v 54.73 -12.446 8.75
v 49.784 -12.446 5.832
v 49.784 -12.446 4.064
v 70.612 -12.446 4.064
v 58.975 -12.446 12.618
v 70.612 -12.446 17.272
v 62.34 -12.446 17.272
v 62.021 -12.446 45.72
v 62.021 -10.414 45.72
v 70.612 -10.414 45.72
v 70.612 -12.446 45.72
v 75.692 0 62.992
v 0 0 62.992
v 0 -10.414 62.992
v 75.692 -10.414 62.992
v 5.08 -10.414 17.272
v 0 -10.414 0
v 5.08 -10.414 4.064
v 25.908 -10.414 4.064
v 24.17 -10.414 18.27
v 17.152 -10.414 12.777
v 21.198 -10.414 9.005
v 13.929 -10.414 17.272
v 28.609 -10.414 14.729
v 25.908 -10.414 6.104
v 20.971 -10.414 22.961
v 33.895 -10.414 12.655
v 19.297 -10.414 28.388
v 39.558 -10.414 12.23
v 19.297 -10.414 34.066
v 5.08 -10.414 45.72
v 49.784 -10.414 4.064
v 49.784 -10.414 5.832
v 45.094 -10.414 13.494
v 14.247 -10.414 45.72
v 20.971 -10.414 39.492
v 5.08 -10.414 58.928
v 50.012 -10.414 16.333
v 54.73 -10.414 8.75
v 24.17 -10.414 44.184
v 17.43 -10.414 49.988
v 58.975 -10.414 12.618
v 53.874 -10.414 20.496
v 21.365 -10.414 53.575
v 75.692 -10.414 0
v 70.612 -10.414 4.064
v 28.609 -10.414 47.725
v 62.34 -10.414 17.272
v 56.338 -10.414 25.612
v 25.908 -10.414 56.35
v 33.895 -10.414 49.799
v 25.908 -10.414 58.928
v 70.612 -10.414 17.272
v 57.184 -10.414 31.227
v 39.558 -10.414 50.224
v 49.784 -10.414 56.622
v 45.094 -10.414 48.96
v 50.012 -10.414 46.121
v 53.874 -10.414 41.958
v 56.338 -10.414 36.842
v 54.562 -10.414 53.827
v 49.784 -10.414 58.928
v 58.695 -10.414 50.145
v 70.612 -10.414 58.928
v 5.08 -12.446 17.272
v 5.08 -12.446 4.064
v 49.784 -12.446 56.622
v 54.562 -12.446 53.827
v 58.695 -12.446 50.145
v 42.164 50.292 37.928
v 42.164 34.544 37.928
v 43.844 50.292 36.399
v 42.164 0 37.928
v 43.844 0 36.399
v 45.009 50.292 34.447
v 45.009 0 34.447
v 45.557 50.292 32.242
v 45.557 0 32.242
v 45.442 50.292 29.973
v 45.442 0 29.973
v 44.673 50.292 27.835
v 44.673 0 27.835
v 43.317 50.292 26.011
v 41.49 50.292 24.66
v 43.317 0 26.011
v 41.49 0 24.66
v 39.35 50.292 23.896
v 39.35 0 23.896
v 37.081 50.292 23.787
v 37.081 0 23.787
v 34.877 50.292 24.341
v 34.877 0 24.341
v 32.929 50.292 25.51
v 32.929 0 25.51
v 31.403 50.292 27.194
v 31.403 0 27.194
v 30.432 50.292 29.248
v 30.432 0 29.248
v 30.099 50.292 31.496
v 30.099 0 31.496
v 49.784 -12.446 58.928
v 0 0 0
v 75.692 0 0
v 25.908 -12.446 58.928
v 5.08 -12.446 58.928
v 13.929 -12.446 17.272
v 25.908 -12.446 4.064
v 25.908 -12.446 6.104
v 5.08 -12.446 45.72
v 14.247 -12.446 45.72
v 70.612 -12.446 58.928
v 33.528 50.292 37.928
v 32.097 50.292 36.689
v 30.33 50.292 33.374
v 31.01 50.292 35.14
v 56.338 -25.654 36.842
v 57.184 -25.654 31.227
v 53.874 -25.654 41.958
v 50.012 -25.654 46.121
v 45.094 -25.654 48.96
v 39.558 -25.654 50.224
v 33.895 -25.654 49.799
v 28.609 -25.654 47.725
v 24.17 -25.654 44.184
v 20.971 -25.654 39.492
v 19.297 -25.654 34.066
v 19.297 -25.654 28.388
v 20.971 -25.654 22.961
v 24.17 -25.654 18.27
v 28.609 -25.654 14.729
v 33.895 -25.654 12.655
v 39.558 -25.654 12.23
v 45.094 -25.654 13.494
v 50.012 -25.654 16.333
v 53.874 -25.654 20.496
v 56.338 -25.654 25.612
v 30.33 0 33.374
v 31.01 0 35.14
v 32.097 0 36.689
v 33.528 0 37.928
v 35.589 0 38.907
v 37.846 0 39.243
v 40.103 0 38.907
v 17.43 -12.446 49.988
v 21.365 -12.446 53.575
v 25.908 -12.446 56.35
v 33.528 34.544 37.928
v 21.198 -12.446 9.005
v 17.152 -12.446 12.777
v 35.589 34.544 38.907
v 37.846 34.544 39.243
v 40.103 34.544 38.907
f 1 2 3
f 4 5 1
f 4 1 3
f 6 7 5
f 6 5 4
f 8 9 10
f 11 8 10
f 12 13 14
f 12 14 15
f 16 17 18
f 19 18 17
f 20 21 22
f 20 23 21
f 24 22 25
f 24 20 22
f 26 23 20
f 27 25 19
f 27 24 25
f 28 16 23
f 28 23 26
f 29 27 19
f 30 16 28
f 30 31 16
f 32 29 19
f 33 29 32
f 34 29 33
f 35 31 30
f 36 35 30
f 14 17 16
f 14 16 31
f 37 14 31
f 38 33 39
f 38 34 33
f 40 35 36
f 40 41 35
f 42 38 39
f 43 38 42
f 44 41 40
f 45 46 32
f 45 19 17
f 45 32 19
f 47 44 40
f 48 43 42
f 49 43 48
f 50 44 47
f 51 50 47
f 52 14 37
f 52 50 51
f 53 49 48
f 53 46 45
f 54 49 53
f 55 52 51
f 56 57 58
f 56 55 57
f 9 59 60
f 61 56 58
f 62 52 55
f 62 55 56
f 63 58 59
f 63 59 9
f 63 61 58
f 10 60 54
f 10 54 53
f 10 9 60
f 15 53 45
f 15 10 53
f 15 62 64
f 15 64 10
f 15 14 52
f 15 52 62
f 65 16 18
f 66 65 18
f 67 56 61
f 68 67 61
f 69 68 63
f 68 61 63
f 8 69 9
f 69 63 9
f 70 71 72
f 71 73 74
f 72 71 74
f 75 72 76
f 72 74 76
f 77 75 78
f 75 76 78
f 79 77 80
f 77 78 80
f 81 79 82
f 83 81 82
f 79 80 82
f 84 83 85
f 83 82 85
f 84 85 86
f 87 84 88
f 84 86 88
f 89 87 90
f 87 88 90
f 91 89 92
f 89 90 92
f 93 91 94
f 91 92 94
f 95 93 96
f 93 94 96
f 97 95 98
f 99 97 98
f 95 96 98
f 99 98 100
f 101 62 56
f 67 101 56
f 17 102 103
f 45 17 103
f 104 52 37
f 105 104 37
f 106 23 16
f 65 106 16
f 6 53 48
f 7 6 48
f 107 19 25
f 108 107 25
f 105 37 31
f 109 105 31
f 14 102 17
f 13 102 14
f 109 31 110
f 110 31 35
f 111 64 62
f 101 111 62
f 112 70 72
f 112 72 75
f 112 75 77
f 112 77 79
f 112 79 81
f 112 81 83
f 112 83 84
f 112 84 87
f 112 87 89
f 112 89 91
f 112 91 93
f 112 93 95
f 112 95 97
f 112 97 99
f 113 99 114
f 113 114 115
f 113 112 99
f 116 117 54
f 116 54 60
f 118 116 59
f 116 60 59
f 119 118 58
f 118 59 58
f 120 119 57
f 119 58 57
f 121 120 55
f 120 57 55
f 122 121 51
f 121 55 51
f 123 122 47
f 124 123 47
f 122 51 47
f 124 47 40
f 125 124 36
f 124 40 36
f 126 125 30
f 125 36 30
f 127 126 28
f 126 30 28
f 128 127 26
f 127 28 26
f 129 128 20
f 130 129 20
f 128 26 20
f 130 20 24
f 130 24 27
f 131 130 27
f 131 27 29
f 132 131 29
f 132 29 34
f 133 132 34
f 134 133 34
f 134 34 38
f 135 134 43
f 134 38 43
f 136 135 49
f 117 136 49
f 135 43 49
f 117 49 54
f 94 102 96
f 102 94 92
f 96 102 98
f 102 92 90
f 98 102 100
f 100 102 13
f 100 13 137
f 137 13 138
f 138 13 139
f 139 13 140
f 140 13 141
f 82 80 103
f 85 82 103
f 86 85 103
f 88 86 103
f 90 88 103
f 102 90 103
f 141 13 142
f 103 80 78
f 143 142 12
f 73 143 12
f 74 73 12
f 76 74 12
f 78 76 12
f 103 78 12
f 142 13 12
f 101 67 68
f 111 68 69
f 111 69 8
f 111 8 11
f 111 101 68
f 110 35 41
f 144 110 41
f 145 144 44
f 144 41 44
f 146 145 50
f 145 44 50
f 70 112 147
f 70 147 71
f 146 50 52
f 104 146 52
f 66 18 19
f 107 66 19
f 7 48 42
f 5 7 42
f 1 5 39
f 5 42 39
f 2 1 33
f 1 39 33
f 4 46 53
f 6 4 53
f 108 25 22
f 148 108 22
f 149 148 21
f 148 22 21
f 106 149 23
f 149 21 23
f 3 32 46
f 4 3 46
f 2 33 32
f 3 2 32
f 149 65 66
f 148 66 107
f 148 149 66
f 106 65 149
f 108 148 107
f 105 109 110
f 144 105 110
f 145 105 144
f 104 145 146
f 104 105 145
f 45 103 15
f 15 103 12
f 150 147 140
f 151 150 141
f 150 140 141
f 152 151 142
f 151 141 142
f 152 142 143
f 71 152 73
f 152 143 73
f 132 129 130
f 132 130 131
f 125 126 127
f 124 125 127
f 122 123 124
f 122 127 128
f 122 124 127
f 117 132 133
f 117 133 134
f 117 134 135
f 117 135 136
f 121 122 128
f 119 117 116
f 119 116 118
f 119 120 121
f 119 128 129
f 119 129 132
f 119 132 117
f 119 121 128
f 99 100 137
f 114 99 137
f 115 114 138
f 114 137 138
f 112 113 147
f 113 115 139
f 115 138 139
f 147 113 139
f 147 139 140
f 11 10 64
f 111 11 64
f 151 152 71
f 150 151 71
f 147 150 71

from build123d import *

# Parameters (mm, degrees)
F0_W     = 75.692
F0_H     = 62.992
F1_DEPTH = 10.414
F3_DEPTH = 2.032
F4_R     = 19.05
F5_DEPTH = 15.24
F7_DEPTH = 50.292
F8_DEPTH = 34.544


with BuildPart() as f1:
    # F0 (on Front) → F1 (new body)
    with BuildSketch(Plane.XZ):
        with Locations((37.846, 31.496)):
            Rectangle(F0_W, F0_H)
    extrude(amount=F1_DEPTH)

    # F2 (on face) → F3 (join)
    with BuildSketch(Plane.XZ.offset(10.414)):
        with BuildLine():
            Line((49.784, 4.064), (70.612, 4.064))
            Line((70.612, 4.064), (70.612, 17.272))
            Line((70.612, 17.272), (62.339714, 17.272))
            ThreePointArc((62.339714, 17.272), (56.952336, 10.57447), (49.784, 5.831505))
            Line((49.784, 5.831505), (49.784, 4.064))
        make_face()
        with BuildLine():
            Line((5.08, 17.272), (5.08, 4.064))
            Line((5.08, 4.064), (25.908, 4.064))
            Line((25.908, 4.064), (25.908, 6.103985))
            ThreePointArc((25.908, 6.103985), (19.081744, 10.790558), (13.928818, 17.272))
            Line((13.928818, 17.272), (5.08, 17.272))
        make_face()
        with BuildLine():
            Line((25.908, 58.928), (5.08, 58.928))
            Line((5.08, 58.928), (5.08, 45.72))
            Line((5.08, 45.72), (14.247149, 45.72))
            ThreePointArc((14.247149, 45.72), (19.311604, 51.875193), (25.908, 56.349862))
            Line((25.908, 56.349862), (25.908, 58.928))
        make_face()
        with BuildLine():
            Line((70.612, 58.928), (49.784, 58.928))
            Line((49.784, 58.928), (49.784, 56.622342))
            ThreePointArc((49.784, 56.622342), (56.720072, 52.088644), (62.021382, 45.72))
            Line((62.021382, 45.72), (70.612, 45.72))
            Line((70.612, 45.72), (70.612, 58.928))
        make_face()
    extrude(amount=F3_DEPTH)

    # F4 (on face) → F5 (join)
    with BuildSketch(Plane.XZ.offset(10.414)):
        with Locations((38.134266, 31.226924)):
            Circle(F4_R)
    extrude(amount=F5_DEPTH)

    # F6 (on face) → F7 (join)
    with BuildSketch(Plane(origin=(0, 0, 0), x_dir=(-1, 0, 0), z_dir=(0, 1, 0))):
        with BuildLine():
            ThreePointArc((-42.164043, 37.927991), (-41.490457, 24.659777), (-30.099, 31.496))
            ThreePointArc((-30.099, 31.496), (-31.009777, 35.140457), (-33.527957, 37.927991))
            Line((-33.527957, 37.927991), (-42.164043, 37.927991))
        make_face()
    extrude(amount=F7_DEPTH)

    # F6 (on face) → F8 (join)
    with BuildSketch(Plane(origin=(0, 0, 0), x_dir=(-1, 0, 0), z_dir=(0, 1, 0))):
        with BuildLine():
            Line((-42.164043, 37.927991), (-33.527957, 37.927991))
            ThreePointArc((-33.527957, 37.927991), (-37.846, 39.243), (-42.164043, 37.927991))
        make_face()
    extrude(amount=F8_DEPTH)


solid = f1.part
